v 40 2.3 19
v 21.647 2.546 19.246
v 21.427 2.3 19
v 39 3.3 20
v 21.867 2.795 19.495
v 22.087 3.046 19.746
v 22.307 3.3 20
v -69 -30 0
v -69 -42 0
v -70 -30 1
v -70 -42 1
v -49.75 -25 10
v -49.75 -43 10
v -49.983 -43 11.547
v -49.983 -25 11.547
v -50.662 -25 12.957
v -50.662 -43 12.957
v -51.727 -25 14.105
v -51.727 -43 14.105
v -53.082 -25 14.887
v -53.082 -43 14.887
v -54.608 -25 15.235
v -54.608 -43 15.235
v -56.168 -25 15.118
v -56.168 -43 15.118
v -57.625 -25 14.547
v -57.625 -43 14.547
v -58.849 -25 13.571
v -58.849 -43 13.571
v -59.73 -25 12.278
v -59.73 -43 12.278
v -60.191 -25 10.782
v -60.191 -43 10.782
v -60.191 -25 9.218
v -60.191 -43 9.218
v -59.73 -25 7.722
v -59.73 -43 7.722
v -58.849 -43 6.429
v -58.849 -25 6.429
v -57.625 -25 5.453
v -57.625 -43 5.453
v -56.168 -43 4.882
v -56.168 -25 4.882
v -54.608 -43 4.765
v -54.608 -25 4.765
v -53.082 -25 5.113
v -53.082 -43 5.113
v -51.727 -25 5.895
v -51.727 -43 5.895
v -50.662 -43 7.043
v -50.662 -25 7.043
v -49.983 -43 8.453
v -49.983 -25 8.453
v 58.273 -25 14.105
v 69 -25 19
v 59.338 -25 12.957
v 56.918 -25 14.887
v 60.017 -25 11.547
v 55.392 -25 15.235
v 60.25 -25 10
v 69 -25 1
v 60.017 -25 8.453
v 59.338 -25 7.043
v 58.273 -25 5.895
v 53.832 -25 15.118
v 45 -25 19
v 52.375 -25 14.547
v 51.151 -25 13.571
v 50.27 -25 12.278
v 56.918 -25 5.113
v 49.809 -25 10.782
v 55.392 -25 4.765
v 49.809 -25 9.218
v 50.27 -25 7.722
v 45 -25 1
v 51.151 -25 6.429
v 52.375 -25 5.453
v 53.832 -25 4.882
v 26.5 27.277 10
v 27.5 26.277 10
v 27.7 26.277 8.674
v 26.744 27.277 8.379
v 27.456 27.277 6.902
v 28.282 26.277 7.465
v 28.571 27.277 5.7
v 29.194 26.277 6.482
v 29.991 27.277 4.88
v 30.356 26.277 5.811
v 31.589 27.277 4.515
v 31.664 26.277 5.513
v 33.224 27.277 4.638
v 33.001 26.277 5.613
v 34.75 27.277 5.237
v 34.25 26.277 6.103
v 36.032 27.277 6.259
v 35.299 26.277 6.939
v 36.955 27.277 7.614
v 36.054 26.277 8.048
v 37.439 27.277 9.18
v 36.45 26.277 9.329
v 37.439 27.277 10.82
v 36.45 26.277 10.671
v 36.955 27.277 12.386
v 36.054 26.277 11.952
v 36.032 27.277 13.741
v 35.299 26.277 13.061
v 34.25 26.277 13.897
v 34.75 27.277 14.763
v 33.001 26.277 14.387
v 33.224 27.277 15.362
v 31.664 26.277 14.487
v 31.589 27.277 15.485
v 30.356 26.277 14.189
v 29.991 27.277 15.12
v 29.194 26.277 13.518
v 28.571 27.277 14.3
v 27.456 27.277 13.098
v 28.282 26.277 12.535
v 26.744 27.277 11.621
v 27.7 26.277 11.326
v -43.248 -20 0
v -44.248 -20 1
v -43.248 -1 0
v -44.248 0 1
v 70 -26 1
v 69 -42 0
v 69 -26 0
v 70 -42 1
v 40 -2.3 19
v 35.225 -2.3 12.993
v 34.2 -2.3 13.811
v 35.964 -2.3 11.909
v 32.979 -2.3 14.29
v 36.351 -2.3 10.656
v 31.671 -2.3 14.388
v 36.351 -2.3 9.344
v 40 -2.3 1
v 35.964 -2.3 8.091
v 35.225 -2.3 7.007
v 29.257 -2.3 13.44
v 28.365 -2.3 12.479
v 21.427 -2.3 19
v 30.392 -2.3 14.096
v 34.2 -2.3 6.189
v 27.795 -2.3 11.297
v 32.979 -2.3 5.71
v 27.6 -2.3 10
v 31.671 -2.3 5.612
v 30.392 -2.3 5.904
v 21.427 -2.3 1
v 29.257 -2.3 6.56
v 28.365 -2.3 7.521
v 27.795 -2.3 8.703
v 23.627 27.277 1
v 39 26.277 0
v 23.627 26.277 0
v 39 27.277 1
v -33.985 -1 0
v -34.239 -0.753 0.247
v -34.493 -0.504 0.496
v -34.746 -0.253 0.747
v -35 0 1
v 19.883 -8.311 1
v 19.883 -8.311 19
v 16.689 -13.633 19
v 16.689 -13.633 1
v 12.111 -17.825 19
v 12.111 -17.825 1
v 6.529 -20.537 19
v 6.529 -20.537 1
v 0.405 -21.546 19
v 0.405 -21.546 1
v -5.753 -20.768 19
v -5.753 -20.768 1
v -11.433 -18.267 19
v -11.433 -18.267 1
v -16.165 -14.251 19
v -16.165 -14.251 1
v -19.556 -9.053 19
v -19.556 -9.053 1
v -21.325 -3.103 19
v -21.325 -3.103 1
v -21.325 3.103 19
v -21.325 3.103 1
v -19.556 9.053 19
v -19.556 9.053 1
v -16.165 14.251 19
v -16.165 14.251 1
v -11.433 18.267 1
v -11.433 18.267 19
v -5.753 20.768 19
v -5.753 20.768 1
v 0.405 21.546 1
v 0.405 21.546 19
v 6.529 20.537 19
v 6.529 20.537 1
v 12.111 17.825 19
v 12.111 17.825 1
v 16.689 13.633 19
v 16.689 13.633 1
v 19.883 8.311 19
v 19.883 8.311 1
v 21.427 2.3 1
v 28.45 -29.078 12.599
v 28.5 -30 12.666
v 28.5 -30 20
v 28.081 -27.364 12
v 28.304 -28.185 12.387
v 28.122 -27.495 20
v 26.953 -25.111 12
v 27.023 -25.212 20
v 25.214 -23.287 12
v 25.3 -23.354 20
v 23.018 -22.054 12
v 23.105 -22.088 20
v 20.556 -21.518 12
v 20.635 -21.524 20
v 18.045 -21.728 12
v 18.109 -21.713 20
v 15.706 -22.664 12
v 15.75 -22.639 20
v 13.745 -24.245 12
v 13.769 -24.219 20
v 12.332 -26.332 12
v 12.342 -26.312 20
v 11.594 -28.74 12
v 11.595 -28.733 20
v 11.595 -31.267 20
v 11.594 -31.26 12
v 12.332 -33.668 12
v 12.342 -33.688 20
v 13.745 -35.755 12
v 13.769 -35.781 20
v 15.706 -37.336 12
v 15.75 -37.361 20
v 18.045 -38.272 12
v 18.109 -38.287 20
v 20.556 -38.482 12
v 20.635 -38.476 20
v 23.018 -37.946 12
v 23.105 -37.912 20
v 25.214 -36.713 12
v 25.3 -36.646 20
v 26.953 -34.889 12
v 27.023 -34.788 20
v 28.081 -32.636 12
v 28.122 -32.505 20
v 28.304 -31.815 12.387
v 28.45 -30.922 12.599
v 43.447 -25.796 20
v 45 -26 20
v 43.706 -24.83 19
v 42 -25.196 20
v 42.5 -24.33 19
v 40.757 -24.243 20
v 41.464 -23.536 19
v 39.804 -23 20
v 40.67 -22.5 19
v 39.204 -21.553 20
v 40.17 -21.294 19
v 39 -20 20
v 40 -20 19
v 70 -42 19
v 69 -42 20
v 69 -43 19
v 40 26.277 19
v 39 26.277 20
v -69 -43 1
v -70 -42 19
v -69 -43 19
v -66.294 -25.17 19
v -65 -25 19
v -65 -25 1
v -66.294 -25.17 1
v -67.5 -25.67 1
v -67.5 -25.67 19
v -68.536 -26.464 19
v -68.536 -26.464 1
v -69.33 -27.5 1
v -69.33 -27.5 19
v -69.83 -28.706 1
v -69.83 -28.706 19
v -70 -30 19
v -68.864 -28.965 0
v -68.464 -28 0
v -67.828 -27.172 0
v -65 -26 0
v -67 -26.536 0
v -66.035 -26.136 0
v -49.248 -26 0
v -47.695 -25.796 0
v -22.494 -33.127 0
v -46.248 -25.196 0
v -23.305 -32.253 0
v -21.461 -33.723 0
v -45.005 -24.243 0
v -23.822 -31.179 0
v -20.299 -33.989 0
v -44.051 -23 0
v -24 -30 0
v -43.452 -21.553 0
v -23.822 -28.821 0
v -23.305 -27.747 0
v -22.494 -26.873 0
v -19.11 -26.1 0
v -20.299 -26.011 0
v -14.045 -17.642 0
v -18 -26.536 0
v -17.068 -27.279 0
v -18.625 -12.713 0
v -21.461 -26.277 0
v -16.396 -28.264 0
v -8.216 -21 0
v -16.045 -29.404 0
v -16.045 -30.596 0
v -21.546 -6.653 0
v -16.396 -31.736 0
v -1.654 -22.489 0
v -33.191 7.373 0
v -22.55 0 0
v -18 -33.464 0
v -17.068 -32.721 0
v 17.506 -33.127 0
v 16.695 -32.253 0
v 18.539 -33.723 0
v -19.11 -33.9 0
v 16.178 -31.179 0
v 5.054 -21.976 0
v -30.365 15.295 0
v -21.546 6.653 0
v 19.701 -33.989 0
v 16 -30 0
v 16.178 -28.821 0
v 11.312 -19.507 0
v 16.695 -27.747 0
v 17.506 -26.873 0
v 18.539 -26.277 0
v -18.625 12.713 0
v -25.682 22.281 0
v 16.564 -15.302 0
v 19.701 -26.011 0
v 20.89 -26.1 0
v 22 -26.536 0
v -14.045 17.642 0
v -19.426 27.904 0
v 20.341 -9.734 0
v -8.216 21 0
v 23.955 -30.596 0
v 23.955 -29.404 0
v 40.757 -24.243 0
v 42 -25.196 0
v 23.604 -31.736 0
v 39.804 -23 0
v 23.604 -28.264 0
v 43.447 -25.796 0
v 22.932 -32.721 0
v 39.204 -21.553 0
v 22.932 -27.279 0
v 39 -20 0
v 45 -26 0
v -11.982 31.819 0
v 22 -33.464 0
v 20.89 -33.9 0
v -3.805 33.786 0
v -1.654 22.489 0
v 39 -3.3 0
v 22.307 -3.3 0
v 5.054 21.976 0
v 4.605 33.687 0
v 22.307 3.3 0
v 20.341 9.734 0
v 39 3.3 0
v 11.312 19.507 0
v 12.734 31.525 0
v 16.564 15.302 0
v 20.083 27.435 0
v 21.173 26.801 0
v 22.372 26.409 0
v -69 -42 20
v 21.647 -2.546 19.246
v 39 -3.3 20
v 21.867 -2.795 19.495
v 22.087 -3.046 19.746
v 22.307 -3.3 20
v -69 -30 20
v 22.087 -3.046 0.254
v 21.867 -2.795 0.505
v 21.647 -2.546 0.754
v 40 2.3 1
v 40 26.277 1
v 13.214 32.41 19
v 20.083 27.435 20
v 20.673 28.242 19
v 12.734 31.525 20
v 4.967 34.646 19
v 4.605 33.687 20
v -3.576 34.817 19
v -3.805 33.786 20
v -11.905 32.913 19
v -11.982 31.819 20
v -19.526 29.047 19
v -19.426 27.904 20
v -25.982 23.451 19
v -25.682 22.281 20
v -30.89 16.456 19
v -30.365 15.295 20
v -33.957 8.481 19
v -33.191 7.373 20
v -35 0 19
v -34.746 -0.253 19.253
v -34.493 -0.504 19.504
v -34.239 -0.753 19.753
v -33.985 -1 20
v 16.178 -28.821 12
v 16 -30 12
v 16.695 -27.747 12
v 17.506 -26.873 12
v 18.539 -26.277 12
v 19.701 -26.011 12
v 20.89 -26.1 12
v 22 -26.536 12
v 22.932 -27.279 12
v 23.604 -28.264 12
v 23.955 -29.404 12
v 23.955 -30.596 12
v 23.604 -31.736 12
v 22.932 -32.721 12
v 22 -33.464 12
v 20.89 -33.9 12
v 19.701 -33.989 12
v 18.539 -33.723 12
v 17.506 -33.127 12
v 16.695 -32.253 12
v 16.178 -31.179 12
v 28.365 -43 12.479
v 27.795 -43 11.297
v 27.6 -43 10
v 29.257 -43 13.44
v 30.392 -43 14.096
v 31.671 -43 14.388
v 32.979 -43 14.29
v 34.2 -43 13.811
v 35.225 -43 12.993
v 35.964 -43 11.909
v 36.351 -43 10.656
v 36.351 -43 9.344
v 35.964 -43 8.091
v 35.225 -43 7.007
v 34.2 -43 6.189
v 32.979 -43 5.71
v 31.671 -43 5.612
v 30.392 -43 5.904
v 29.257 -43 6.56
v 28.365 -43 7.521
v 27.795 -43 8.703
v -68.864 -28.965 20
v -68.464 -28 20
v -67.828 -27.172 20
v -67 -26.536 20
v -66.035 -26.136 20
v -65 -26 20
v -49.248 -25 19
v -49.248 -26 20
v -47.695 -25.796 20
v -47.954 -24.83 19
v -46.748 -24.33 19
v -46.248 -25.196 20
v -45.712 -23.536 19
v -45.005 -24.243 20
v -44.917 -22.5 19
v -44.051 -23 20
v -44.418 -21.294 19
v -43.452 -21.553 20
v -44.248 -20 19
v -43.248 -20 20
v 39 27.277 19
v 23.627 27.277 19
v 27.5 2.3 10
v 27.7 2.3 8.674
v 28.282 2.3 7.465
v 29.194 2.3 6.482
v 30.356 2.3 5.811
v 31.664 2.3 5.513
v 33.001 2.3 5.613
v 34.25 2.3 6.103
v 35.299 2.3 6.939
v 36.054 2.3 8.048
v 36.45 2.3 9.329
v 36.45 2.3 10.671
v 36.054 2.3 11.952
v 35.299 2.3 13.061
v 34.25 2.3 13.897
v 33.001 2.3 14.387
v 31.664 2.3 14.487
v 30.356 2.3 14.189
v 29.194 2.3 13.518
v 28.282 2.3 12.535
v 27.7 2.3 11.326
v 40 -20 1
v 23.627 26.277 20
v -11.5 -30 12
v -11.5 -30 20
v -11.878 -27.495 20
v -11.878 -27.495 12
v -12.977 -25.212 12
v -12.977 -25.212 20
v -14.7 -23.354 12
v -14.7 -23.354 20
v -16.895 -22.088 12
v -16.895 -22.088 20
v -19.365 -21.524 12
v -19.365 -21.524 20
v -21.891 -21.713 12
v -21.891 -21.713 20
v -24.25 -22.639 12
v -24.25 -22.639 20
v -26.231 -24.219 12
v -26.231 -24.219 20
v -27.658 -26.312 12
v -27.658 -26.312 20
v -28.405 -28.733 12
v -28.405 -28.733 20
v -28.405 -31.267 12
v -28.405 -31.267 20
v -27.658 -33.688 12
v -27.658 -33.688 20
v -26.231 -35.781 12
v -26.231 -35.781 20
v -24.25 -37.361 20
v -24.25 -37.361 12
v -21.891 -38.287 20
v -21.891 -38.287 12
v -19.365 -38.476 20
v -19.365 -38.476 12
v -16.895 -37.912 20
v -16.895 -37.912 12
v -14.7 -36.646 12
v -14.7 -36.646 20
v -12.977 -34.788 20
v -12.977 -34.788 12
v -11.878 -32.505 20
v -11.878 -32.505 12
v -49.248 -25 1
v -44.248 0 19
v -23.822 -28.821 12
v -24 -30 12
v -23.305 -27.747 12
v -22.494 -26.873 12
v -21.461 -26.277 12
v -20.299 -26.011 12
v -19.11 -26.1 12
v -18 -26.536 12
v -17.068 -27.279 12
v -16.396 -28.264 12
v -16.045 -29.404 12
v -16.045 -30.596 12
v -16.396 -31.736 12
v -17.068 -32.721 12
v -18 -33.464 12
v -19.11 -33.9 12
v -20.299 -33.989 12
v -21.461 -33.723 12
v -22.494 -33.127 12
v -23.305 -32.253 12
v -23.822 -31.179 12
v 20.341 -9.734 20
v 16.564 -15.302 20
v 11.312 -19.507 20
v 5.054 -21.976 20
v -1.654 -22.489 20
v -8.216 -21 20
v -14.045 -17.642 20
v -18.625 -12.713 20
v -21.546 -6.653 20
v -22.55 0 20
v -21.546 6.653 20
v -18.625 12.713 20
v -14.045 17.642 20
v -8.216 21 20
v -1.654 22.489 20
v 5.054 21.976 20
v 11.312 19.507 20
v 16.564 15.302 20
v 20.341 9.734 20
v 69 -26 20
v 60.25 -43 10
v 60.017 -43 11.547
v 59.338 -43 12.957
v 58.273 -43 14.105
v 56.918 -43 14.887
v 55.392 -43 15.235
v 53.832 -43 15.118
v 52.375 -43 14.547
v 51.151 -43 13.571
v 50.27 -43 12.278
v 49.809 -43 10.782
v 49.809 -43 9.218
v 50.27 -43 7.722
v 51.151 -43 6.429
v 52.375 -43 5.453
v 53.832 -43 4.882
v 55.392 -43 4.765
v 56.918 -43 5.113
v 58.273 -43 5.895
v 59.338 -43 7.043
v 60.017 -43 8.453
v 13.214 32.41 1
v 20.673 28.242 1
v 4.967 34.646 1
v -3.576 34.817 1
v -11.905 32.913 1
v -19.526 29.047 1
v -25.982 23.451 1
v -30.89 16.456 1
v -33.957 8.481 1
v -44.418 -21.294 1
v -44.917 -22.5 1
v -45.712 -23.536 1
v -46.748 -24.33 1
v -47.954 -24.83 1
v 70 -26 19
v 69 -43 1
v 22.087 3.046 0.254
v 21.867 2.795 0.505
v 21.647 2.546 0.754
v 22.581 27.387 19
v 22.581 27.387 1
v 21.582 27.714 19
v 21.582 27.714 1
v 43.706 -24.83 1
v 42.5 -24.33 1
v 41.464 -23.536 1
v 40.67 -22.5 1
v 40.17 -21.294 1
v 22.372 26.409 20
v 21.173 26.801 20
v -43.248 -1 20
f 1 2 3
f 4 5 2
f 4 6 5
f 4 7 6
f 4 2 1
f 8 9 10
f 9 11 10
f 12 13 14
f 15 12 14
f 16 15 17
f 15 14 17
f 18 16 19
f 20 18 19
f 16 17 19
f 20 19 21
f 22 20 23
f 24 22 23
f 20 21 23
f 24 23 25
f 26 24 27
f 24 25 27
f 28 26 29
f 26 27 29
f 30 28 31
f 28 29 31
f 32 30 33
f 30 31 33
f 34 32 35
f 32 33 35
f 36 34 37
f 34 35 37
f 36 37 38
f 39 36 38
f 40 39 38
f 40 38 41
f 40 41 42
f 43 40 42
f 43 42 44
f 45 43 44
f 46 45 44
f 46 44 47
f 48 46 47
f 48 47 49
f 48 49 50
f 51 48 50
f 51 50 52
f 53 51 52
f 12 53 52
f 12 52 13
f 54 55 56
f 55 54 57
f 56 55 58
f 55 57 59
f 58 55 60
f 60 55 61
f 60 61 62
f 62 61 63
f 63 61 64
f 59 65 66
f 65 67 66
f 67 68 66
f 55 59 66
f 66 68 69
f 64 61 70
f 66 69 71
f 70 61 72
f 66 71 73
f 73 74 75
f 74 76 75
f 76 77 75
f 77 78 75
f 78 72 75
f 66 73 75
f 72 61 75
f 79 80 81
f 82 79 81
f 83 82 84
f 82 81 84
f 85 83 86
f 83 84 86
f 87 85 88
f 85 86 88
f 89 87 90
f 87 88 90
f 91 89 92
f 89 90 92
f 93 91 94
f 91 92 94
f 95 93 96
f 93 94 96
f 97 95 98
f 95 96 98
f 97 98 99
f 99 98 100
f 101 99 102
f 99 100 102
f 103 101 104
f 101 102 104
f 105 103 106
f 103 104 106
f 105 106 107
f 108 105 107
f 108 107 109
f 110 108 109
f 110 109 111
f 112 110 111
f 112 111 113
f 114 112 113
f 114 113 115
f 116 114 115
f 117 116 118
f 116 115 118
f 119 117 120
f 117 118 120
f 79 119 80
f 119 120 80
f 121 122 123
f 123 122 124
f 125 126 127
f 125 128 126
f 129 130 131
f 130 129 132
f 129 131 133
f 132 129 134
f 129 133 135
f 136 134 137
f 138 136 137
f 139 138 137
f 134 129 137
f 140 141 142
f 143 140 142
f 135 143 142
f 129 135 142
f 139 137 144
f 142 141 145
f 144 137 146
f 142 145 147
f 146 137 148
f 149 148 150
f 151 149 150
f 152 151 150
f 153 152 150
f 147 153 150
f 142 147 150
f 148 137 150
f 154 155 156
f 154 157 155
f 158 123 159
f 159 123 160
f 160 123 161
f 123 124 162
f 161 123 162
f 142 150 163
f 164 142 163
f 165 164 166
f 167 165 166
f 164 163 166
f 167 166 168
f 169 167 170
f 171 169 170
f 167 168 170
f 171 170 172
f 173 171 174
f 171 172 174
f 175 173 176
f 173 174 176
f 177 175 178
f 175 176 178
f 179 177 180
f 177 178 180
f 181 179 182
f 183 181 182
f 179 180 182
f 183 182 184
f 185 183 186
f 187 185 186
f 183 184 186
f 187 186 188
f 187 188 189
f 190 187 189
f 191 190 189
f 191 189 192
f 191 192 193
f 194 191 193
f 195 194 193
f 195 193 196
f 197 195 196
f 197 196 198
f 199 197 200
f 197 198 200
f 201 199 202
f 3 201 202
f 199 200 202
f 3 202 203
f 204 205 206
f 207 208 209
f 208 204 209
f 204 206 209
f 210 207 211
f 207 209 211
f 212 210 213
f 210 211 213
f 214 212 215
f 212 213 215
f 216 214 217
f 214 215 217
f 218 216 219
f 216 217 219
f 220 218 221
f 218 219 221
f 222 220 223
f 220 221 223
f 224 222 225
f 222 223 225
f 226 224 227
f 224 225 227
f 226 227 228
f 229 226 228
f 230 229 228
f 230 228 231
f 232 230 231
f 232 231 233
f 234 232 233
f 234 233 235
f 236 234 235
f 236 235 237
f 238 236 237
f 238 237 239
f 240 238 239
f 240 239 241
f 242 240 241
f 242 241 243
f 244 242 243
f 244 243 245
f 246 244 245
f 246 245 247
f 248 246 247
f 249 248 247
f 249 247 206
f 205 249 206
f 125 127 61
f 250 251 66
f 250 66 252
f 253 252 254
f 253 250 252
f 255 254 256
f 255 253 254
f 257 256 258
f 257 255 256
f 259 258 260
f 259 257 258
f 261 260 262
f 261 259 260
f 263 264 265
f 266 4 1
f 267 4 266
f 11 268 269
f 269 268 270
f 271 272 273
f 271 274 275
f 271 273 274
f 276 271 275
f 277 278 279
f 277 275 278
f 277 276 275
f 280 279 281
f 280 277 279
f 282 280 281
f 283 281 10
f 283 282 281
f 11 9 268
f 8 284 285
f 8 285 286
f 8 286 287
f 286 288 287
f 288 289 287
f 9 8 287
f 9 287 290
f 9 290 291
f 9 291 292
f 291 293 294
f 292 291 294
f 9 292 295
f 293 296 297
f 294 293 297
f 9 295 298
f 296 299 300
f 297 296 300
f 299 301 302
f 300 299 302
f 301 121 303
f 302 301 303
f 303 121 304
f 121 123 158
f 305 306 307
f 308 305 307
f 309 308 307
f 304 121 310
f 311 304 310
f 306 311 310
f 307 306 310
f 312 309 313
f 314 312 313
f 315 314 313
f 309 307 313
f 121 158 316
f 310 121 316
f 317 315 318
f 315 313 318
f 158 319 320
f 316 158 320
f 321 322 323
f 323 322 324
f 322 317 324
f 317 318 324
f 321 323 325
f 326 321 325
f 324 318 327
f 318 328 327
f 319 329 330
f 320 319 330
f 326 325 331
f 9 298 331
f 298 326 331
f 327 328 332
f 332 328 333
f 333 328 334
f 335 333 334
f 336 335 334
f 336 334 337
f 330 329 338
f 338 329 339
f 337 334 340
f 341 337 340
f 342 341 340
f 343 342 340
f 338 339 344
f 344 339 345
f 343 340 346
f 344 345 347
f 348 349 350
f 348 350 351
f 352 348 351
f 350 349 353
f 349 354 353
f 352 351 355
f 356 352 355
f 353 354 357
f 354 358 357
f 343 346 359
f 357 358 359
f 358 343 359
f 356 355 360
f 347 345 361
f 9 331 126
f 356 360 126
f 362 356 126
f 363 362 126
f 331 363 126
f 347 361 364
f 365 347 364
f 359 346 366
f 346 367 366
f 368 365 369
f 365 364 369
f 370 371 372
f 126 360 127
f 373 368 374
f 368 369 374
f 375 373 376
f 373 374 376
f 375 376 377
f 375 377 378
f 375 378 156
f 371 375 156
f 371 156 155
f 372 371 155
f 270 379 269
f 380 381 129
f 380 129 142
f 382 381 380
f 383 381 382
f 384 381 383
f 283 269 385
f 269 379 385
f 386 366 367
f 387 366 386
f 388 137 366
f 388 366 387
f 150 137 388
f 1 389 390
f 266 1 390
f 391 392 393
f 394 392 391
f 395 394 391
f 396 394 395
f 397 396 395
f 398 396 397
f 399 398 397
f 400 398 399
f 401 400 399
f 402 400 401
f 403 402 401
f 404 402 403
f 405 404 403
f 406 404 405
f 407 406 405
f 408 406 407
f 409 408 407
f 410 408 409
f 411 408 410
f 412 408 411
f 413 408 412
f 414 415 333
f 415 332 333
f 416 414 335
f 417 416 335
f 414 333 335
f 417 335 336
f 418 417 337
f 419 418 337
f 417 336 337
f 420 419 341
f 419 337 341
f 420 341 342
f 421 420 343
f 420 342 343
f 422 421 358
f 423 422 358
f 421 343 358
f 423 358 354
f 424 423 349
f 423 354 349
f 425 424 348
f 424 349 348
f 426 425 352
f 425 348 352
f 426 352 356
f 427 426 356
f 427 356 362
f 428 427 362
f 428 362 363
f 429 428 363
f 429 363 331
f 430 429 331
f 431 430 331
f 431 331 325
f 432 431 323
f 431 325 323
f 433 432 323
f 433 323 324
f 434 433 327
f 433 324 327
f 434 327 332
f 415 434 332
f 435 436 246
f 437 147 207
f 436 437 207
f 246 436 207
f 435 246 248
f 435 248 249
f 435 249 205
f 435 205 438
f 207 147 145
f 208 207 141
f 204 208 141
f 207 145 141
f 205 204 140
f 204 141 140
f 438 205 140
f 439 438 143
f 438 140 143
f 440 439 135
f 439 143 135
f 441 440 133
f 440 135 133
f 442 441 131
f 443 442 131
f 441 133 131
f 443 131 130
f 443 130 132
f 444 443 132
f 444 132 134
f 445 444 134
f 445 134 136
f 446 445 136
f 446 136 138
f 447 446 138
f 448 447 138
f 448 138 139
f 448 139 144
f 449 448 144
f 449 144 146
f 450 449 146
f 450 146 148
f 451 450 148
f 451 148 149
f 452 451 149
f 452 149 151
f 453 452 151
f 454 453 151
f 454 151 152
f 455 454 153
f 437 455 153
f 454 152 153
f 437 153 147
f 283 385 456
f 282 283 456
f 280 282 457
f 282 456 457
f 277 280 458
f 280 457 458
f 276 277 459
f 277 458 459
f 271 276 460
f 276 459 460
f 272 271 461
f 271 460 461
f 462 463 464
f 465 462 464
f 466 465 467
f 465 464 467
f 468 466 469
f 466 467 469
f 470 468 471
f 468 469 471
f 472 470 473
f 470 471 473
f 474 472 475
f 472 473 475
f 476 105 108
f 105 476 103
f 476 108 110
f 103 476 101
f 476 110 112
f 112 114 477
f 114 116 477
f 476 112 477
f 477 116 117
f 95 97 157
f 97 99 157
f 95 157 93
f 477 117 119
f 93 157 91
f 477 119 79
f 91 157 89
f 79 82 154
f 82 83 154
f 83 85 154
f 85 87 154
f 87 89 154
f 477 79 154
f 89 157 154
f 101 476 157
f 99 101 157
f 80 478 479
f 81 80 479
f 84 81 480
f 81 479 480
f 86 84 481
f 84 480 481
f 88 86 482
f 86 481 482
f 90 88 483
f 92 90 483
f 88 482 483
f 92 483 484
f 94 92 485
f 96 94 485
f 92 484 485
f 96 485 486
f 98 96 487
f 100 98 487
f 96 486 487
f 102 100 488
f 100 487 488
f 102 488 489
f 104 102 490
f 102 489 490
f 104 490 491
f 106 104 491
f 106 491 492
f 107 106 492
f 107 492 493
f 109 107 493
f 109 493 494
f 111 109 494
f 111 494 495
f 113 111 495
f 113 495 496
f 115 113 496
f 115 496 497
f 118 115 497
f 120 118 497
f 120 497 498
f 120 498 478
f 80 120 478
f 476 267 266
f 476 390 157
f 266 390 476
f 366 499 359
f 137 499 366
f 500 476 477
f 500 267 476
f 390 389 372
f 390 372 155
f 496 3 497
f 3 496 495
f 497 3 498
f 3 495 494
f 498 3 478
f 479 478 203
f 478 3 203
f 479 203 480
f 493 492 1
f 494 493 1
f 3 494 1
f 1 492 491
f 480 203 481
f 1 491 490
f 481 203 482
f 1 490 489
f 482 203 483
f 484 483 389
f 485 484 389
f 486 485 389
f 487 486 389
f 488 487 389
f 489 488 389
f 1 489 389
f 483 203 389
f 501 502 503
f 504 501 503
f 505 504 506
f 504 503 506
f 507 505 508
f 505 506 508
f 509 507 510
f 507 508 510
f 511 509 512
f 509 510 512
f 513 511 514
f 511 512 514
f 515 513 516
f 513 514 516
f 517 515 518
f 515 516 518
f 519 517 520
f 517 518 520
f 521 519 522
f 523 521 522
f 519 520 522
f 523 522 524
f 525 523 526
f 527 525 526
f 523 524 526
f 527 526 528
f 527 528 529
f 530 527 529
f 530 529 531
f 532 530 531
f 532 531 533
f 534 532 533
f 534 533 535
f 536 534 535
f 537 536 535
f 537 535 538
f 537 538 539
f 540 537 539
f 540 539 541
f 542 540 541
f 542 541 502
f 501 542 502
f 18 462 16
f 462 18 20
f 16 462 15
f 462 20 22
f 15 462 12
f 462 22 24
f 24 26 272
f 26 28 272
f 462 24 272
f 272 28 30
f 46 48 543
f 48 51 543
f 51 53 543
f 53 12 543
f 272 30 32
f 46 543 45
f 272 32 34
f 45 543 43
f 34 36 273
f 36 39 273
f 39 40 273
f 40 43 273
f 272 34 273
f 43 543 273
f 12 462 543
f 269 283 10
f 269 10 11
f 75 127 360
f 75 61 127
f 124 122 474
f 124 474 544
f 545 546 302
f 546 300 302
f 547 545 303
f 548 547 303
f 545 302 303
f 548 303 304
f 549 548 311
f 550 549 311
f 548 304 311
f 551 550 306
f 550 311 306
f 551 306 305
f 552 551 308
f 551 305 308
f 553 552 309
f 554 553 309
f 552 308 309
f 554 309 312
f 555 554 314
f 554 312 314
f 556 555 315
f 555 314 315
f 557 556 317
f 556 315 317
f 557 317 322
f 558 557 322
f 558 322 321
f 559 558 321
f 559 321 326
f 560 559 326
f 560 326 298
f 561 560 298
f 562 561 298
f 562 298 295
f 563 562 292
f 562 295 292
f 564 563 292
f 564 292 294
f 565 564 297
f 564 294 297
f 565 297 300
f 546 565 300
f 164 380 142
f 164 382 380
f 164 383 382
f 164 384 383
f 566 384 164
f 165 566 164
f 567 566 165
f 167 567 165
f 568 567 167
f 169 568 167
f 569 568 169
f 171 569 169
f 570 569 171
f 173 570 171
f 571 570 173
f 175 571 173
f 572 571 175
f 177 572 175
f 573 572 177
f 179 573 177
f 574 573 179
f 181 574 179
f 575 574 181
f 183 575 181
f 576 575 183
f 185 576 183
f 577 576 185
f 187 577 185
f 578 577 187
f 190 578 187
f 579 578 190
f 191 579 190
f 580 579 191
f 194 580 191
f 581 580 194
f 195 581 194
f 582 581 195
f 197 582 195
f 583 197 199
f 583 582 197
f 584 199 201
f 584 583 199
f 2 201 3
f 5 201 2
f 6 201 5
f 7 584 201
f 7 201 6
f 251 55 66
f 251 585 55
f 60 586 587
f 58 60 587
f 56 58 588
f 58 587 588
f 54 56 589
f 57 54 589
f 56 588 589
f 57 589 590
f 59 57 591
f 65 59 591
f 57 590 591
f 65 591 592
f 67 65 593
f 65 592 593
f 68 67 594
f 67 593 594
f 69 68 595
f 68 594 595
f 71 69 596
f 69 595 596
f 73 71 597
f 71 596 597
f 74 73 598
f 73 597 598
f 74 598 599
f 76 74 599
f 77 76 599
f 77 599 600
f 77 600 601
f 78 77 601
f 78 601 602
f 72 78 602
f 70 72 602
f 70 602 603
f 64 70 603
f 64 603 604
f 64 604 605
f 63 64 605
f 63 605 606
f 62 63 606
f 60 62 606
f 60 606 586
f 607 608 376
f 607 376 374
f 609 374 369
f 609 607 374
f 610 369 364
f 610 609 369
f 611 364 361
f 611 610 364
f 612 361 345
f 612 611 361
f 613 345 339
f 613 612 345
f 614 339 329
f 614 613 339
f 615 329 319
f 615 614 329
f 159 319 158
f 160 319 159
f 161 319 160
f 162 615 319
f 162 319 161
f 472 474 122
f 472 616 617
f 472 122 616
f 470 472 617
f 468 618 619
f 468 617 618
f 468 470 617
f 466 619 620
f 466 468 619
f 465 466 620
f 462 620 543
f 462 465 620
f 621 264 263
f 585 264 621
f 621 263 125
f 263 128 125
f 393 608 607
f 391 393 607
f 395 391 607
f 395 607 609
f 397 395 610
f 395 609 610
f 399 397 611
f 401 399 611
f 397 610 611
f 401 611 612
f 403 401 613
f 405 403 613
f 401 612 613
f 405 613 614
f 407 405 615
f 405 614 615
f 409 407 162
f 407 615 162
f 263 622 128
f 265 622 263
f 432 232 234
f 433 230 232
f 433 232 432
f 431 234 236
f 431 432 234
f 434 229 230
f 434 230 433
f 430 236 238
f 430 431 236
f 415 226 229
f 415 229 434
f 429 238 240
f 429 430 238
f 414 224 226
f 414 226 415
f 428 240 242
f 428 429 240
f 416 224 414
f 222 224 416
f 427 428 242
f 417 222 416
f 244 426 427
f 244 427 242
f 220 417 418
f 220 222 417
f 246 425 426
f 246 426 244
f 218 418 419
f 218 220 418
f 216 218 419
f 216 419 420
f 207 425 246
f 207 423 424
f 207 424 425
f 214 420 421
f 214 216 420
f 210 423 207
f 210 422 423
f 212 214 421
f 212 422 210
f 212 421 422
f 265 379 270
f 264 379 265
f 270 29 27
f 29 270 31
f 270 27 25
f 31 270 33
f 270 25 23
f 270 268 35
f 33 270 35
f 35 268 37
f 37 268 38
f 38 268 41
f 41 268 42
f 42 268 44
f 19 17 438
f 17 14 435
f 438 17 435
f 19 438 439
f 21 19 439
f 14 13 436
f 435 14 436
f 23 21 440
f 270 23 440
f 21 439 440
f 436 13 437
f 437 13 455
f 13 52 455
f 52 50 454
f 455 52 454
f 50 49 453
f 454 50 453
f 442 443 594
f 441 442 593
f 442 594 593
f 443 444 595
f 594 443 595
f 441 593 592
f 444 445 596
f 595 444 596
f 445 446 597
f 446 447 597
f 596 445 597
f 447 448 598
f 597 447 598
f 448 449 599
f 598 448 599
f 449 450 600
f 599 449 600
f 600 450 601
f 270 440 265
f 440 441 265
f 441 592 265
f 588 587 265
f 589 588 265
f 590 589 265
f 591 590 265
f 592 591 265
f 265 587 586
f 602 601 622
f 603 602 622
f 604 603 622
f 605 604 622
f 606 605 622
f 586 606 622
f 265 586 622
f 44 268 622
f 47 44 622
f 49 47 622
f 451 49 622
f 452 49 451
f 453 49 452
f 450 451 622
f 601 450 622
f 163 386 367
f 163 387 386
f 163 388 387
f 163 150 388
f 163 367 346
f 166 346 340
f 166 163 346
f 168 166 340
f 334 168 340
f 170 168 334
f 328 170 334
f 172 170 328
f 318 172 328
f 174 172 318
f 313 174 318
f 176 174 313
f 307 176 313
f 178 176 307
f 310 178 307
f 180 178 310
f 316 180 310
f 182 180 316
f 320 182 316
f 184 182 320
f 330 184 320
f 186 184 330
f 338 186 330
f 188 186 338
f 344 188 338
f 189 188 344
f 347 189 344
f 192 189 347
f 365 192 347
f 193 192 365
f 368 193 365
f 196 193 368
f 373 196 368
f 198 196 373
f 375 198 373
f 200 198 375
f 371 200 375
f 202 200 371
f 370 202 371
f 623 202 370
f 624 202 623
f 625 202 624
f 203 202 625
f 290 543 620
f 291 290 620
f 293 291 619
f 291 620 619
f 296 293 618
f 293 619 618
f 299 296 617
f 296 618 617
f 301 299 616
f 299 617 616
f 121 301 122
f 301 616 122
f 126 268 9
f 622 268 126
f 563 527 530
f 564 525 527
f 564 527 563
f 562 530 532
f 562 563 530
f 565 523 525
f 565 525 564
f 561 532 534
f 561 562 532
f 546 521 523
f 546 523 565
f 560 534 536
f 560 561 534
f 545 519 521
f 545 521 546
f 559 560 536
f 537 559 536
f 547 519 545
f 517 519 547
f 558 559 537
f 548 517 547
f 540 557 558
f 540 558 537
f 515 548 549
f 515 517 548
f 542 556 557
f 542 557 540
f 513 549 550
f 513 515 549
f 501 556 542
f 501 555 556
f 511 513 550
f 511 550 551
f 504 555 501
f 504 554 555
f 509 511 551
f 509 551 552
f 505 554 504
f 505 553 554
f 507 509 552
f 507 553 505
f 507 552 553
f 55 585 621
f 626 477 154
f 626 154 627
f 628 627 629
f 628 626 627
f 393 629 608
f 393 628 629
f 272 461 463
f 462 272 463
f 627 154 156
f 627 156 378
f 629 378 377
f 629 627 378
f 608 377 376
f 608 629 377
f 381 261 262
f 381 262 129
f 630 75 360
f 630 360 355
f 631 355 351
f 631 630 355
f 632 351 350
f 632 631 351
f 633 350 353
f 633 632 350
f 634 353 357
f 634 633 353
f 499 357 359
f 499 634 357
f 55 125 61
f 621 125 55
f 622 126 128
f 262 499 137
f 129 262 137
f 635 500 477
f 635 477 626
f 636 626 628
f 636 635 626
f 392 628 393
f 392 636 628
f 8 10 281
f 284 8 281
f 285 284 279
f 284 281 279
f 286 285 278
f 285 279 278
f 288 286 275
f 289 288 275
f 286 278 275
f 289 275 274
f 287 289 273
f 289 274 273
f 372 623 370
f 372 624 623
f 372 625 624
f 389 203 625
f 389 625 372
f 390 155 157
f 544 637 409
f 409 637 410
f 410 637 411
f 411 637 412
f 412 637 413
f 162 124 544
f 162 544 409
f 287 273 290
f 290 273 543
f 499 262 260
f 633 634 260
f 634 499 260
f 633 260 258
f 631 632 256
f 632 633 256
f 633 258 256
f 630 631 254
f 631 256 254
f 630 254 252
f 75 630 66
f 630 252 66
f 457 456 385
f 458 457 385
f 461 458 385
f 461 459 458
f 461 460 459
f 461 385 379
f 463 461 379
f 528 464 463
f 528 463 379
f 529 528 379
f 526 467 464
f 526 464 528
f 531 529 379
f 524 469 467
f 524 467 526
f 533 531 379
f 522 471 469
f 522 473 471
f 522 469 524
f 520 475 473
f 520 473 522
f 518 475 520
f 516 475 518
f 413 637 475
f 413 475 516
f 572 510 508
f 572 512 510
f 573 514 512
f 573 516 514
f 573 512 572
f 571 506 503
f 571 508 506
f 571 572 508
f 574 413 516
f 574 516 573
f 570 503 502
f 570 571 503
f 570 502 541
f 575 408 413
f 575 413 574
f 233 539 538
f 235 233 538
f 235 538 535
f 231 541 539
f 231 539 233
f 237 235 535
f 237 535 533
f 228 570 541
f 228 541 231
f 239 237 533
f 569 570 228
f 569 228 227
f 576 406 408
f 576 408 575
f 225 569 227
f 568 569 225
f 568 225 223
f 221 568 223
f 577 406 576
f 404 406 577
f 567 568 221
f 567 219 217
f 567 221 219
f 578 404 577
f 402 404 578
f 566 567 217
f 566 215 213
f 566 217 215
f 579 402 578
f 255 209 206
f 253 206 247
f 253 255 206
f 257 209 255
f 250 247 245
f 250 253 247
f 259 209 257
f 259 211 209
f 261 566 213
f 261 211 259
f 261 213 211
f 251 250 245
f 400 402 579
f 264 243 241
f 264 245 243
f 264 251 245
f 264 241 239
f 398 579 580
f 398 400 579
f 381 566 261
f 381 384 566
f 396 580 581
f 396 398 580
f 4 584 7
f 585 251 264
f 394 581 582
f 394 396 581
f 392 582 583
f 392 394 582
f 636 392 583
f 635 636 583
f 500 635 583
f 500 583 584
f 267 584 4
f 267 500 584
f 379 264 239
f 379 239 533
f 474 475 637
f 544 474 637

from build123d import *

# Parameters (mm, degrees)
F0_W            = 9.2476086318
F0_H            = 25
F1_DEPTH        = 20
F3_D            = 8.8
F3_DEPTH        = 40.701
F4_D            = 9
F4_DEPTH        = 37.301
F6_D            = 10.5
F7_R            = 5
F8_SIZE         = 1
F10_D           = 8
F10_CBORE_D     = 17
F10_CBORE_DEPTH = 8


# Not quite as in the source:
# - a feature names something its author has since deleted; it is built from what else it names


with BuildPart() as f1:
    # F0 (on Top) → F1 (new body)
    with BuildSketch(Plane.XY):
        with BuildLine():
            ThreePointArc((21.4269106499, -2.3), (-21.55, 0), (21.4269106499, 2.3))
            Line((21.4269106499, 2.3), (40, 2.3))
            Line((40, 2.3), (40, 27.2765494883))
            Line((40, 27.2765494883), (21.9314807528, 27.2765494883))
            ThreePointArc((21.9314807528, 27.2765494883), (-15.122800231, 31.5642347155), (-35, 0))
            ThreePointArc((-35, 0), (-1.1506219411, -34.9810815892), (34.9243468085, -2.3))
            Line((34.9243468085, -2.3), (21.4269106499, -2.3))
        make_face()
        with BuildLine():
            Line((40, -2.3), (34.9243468085, -2.3))
            ThreePointArc((34.9243468085, -2.3), (-1.1506219411, -34.9810815892), (-35, 0))
            Line((-35, 0), (-35, -25))
            Line((-35, -25), (-44.2476086318, -25))
            Line((-44.2476086318, -25), (-70, -25))
            Line((-70, -25), (-70, -43))
            Line((-70, -43), (70, -43))
            Line((70, -43), (70, -25))
            Line((70, -25), (40, -25))
            Line((40, -25), (40, -2.3))
        make_face()
        with Locations((-39.6238043159, -12.5)):
            Rectangle(F0_W, F0_H)
    extrude(amount=F1_DEPTH)

    # F3 (through all, one way)
    with BuildSketch(Plane(origin=(0, -2.3, 0), x_dir=(-1, 0, 0), z_dir=(0, 1, 0))):
        with Locations((-32, 10)):
            Circle(F3_D / 2)
    extrude(amount=-F3_DEPTH, mode=Mode.SUBTRACT)

    # F4 (through all, one way)
    with BuildSketch(Plane(origin=(0, -2.3, 0), x_dir=(-1, 0, 0), z_dir=(0, -1, 0))):
        with Locations((-32, -10)):
            Circle(F4_D / 2)
    extrude(amount=-F4_DEPTH, mode=Mode.SUBTRACT)

    # F6 (through all)
    with Locations(Plane(origin=(0, -25, 0), x_dir=(-1, 0, 0), z_dir=(0, 1, 0))):
        with Locations((55, 10), (-55, 10)):
            Hole(F6_D / 2)

    # F7
    f7_edges = [f1.edges().sort_by_distance(p)[0] for p in [
        (40, -25, 10),
        (21.931481, 27.276549, 10),
        (-44.247609, -25, 10),
        (-70, -25, 10),
    ]]
    fillet(f7_edges, radius=F7_R)

    # F8
    f8_edges = [f1.edges().sort_by_distance(p)[0] for p in [
        (31.813386, 27.276549, 20),
        (22.073202, 27.524032, 20),
        (40, 14.788275, 20),
        (-15.833984, 31.213538, 20),
        (30.713455, 2.3, 20),
        (-39.623804, 0, 20),
        (-21.55, 0, 20),
        (-44.247609, -10, 20),
        (30.713455, -2.3, 20),
        (-45.712075, -23.535534, 20),
        (40, -11.15, 20),
        (-57.123804, -25, 20),
        (41.464466, -23.535534, 20),
        (-68.535534, -26.464466, 20),
        (57.5, -25, 20),
        (-70, -36.5, 20),
        (70, -34, 20),
        (0, -43, 20),
        (31.813386, 27.276549, 0),
        (22.073202, 27.524032, 0),
        (40, 14.788275, 0),
        (-15.833984, 31.213538, 0),
        (30.713455, 2.3, 0),
        (-39.623804, 0, 0),
        (-21.55, 0, 0),
        (-44.247609, -10, 0),
        (30.713455, -2.3, 0),
        (-45.712075, -23.535534, 0),
        (40, -11.15, 0),
        (-57.123804, -25, 0),
        (41.464466, -23.535534, 0),
        (-68.535534, -26.464466, 0),
        (57.5, -25, 0),
        (-70, -36.5, 0),
        (70, -34, 0),
        (0, -43, 0),
        (23.626772, 27.276549, 10),
        (40, 27.276549, 10),
        (36.5, 27.276549, 10),
        (-70, -30, 10),
        (-70, -43, 10),
        (70, -43, 10),
        (70, -25, 10),
    ]]
    chamfer(f8_edges, length=F8_SIZE)

    # F10 (through all)
    with Locations(Plane.XY.offset(20)):
        with Locations((-20, -30), (20, -30)):
            CounterBoreHole(F10_D / 2, F10_CBORE_D / 2, F10_CBORE_DEPTH)


solid = f1.part
